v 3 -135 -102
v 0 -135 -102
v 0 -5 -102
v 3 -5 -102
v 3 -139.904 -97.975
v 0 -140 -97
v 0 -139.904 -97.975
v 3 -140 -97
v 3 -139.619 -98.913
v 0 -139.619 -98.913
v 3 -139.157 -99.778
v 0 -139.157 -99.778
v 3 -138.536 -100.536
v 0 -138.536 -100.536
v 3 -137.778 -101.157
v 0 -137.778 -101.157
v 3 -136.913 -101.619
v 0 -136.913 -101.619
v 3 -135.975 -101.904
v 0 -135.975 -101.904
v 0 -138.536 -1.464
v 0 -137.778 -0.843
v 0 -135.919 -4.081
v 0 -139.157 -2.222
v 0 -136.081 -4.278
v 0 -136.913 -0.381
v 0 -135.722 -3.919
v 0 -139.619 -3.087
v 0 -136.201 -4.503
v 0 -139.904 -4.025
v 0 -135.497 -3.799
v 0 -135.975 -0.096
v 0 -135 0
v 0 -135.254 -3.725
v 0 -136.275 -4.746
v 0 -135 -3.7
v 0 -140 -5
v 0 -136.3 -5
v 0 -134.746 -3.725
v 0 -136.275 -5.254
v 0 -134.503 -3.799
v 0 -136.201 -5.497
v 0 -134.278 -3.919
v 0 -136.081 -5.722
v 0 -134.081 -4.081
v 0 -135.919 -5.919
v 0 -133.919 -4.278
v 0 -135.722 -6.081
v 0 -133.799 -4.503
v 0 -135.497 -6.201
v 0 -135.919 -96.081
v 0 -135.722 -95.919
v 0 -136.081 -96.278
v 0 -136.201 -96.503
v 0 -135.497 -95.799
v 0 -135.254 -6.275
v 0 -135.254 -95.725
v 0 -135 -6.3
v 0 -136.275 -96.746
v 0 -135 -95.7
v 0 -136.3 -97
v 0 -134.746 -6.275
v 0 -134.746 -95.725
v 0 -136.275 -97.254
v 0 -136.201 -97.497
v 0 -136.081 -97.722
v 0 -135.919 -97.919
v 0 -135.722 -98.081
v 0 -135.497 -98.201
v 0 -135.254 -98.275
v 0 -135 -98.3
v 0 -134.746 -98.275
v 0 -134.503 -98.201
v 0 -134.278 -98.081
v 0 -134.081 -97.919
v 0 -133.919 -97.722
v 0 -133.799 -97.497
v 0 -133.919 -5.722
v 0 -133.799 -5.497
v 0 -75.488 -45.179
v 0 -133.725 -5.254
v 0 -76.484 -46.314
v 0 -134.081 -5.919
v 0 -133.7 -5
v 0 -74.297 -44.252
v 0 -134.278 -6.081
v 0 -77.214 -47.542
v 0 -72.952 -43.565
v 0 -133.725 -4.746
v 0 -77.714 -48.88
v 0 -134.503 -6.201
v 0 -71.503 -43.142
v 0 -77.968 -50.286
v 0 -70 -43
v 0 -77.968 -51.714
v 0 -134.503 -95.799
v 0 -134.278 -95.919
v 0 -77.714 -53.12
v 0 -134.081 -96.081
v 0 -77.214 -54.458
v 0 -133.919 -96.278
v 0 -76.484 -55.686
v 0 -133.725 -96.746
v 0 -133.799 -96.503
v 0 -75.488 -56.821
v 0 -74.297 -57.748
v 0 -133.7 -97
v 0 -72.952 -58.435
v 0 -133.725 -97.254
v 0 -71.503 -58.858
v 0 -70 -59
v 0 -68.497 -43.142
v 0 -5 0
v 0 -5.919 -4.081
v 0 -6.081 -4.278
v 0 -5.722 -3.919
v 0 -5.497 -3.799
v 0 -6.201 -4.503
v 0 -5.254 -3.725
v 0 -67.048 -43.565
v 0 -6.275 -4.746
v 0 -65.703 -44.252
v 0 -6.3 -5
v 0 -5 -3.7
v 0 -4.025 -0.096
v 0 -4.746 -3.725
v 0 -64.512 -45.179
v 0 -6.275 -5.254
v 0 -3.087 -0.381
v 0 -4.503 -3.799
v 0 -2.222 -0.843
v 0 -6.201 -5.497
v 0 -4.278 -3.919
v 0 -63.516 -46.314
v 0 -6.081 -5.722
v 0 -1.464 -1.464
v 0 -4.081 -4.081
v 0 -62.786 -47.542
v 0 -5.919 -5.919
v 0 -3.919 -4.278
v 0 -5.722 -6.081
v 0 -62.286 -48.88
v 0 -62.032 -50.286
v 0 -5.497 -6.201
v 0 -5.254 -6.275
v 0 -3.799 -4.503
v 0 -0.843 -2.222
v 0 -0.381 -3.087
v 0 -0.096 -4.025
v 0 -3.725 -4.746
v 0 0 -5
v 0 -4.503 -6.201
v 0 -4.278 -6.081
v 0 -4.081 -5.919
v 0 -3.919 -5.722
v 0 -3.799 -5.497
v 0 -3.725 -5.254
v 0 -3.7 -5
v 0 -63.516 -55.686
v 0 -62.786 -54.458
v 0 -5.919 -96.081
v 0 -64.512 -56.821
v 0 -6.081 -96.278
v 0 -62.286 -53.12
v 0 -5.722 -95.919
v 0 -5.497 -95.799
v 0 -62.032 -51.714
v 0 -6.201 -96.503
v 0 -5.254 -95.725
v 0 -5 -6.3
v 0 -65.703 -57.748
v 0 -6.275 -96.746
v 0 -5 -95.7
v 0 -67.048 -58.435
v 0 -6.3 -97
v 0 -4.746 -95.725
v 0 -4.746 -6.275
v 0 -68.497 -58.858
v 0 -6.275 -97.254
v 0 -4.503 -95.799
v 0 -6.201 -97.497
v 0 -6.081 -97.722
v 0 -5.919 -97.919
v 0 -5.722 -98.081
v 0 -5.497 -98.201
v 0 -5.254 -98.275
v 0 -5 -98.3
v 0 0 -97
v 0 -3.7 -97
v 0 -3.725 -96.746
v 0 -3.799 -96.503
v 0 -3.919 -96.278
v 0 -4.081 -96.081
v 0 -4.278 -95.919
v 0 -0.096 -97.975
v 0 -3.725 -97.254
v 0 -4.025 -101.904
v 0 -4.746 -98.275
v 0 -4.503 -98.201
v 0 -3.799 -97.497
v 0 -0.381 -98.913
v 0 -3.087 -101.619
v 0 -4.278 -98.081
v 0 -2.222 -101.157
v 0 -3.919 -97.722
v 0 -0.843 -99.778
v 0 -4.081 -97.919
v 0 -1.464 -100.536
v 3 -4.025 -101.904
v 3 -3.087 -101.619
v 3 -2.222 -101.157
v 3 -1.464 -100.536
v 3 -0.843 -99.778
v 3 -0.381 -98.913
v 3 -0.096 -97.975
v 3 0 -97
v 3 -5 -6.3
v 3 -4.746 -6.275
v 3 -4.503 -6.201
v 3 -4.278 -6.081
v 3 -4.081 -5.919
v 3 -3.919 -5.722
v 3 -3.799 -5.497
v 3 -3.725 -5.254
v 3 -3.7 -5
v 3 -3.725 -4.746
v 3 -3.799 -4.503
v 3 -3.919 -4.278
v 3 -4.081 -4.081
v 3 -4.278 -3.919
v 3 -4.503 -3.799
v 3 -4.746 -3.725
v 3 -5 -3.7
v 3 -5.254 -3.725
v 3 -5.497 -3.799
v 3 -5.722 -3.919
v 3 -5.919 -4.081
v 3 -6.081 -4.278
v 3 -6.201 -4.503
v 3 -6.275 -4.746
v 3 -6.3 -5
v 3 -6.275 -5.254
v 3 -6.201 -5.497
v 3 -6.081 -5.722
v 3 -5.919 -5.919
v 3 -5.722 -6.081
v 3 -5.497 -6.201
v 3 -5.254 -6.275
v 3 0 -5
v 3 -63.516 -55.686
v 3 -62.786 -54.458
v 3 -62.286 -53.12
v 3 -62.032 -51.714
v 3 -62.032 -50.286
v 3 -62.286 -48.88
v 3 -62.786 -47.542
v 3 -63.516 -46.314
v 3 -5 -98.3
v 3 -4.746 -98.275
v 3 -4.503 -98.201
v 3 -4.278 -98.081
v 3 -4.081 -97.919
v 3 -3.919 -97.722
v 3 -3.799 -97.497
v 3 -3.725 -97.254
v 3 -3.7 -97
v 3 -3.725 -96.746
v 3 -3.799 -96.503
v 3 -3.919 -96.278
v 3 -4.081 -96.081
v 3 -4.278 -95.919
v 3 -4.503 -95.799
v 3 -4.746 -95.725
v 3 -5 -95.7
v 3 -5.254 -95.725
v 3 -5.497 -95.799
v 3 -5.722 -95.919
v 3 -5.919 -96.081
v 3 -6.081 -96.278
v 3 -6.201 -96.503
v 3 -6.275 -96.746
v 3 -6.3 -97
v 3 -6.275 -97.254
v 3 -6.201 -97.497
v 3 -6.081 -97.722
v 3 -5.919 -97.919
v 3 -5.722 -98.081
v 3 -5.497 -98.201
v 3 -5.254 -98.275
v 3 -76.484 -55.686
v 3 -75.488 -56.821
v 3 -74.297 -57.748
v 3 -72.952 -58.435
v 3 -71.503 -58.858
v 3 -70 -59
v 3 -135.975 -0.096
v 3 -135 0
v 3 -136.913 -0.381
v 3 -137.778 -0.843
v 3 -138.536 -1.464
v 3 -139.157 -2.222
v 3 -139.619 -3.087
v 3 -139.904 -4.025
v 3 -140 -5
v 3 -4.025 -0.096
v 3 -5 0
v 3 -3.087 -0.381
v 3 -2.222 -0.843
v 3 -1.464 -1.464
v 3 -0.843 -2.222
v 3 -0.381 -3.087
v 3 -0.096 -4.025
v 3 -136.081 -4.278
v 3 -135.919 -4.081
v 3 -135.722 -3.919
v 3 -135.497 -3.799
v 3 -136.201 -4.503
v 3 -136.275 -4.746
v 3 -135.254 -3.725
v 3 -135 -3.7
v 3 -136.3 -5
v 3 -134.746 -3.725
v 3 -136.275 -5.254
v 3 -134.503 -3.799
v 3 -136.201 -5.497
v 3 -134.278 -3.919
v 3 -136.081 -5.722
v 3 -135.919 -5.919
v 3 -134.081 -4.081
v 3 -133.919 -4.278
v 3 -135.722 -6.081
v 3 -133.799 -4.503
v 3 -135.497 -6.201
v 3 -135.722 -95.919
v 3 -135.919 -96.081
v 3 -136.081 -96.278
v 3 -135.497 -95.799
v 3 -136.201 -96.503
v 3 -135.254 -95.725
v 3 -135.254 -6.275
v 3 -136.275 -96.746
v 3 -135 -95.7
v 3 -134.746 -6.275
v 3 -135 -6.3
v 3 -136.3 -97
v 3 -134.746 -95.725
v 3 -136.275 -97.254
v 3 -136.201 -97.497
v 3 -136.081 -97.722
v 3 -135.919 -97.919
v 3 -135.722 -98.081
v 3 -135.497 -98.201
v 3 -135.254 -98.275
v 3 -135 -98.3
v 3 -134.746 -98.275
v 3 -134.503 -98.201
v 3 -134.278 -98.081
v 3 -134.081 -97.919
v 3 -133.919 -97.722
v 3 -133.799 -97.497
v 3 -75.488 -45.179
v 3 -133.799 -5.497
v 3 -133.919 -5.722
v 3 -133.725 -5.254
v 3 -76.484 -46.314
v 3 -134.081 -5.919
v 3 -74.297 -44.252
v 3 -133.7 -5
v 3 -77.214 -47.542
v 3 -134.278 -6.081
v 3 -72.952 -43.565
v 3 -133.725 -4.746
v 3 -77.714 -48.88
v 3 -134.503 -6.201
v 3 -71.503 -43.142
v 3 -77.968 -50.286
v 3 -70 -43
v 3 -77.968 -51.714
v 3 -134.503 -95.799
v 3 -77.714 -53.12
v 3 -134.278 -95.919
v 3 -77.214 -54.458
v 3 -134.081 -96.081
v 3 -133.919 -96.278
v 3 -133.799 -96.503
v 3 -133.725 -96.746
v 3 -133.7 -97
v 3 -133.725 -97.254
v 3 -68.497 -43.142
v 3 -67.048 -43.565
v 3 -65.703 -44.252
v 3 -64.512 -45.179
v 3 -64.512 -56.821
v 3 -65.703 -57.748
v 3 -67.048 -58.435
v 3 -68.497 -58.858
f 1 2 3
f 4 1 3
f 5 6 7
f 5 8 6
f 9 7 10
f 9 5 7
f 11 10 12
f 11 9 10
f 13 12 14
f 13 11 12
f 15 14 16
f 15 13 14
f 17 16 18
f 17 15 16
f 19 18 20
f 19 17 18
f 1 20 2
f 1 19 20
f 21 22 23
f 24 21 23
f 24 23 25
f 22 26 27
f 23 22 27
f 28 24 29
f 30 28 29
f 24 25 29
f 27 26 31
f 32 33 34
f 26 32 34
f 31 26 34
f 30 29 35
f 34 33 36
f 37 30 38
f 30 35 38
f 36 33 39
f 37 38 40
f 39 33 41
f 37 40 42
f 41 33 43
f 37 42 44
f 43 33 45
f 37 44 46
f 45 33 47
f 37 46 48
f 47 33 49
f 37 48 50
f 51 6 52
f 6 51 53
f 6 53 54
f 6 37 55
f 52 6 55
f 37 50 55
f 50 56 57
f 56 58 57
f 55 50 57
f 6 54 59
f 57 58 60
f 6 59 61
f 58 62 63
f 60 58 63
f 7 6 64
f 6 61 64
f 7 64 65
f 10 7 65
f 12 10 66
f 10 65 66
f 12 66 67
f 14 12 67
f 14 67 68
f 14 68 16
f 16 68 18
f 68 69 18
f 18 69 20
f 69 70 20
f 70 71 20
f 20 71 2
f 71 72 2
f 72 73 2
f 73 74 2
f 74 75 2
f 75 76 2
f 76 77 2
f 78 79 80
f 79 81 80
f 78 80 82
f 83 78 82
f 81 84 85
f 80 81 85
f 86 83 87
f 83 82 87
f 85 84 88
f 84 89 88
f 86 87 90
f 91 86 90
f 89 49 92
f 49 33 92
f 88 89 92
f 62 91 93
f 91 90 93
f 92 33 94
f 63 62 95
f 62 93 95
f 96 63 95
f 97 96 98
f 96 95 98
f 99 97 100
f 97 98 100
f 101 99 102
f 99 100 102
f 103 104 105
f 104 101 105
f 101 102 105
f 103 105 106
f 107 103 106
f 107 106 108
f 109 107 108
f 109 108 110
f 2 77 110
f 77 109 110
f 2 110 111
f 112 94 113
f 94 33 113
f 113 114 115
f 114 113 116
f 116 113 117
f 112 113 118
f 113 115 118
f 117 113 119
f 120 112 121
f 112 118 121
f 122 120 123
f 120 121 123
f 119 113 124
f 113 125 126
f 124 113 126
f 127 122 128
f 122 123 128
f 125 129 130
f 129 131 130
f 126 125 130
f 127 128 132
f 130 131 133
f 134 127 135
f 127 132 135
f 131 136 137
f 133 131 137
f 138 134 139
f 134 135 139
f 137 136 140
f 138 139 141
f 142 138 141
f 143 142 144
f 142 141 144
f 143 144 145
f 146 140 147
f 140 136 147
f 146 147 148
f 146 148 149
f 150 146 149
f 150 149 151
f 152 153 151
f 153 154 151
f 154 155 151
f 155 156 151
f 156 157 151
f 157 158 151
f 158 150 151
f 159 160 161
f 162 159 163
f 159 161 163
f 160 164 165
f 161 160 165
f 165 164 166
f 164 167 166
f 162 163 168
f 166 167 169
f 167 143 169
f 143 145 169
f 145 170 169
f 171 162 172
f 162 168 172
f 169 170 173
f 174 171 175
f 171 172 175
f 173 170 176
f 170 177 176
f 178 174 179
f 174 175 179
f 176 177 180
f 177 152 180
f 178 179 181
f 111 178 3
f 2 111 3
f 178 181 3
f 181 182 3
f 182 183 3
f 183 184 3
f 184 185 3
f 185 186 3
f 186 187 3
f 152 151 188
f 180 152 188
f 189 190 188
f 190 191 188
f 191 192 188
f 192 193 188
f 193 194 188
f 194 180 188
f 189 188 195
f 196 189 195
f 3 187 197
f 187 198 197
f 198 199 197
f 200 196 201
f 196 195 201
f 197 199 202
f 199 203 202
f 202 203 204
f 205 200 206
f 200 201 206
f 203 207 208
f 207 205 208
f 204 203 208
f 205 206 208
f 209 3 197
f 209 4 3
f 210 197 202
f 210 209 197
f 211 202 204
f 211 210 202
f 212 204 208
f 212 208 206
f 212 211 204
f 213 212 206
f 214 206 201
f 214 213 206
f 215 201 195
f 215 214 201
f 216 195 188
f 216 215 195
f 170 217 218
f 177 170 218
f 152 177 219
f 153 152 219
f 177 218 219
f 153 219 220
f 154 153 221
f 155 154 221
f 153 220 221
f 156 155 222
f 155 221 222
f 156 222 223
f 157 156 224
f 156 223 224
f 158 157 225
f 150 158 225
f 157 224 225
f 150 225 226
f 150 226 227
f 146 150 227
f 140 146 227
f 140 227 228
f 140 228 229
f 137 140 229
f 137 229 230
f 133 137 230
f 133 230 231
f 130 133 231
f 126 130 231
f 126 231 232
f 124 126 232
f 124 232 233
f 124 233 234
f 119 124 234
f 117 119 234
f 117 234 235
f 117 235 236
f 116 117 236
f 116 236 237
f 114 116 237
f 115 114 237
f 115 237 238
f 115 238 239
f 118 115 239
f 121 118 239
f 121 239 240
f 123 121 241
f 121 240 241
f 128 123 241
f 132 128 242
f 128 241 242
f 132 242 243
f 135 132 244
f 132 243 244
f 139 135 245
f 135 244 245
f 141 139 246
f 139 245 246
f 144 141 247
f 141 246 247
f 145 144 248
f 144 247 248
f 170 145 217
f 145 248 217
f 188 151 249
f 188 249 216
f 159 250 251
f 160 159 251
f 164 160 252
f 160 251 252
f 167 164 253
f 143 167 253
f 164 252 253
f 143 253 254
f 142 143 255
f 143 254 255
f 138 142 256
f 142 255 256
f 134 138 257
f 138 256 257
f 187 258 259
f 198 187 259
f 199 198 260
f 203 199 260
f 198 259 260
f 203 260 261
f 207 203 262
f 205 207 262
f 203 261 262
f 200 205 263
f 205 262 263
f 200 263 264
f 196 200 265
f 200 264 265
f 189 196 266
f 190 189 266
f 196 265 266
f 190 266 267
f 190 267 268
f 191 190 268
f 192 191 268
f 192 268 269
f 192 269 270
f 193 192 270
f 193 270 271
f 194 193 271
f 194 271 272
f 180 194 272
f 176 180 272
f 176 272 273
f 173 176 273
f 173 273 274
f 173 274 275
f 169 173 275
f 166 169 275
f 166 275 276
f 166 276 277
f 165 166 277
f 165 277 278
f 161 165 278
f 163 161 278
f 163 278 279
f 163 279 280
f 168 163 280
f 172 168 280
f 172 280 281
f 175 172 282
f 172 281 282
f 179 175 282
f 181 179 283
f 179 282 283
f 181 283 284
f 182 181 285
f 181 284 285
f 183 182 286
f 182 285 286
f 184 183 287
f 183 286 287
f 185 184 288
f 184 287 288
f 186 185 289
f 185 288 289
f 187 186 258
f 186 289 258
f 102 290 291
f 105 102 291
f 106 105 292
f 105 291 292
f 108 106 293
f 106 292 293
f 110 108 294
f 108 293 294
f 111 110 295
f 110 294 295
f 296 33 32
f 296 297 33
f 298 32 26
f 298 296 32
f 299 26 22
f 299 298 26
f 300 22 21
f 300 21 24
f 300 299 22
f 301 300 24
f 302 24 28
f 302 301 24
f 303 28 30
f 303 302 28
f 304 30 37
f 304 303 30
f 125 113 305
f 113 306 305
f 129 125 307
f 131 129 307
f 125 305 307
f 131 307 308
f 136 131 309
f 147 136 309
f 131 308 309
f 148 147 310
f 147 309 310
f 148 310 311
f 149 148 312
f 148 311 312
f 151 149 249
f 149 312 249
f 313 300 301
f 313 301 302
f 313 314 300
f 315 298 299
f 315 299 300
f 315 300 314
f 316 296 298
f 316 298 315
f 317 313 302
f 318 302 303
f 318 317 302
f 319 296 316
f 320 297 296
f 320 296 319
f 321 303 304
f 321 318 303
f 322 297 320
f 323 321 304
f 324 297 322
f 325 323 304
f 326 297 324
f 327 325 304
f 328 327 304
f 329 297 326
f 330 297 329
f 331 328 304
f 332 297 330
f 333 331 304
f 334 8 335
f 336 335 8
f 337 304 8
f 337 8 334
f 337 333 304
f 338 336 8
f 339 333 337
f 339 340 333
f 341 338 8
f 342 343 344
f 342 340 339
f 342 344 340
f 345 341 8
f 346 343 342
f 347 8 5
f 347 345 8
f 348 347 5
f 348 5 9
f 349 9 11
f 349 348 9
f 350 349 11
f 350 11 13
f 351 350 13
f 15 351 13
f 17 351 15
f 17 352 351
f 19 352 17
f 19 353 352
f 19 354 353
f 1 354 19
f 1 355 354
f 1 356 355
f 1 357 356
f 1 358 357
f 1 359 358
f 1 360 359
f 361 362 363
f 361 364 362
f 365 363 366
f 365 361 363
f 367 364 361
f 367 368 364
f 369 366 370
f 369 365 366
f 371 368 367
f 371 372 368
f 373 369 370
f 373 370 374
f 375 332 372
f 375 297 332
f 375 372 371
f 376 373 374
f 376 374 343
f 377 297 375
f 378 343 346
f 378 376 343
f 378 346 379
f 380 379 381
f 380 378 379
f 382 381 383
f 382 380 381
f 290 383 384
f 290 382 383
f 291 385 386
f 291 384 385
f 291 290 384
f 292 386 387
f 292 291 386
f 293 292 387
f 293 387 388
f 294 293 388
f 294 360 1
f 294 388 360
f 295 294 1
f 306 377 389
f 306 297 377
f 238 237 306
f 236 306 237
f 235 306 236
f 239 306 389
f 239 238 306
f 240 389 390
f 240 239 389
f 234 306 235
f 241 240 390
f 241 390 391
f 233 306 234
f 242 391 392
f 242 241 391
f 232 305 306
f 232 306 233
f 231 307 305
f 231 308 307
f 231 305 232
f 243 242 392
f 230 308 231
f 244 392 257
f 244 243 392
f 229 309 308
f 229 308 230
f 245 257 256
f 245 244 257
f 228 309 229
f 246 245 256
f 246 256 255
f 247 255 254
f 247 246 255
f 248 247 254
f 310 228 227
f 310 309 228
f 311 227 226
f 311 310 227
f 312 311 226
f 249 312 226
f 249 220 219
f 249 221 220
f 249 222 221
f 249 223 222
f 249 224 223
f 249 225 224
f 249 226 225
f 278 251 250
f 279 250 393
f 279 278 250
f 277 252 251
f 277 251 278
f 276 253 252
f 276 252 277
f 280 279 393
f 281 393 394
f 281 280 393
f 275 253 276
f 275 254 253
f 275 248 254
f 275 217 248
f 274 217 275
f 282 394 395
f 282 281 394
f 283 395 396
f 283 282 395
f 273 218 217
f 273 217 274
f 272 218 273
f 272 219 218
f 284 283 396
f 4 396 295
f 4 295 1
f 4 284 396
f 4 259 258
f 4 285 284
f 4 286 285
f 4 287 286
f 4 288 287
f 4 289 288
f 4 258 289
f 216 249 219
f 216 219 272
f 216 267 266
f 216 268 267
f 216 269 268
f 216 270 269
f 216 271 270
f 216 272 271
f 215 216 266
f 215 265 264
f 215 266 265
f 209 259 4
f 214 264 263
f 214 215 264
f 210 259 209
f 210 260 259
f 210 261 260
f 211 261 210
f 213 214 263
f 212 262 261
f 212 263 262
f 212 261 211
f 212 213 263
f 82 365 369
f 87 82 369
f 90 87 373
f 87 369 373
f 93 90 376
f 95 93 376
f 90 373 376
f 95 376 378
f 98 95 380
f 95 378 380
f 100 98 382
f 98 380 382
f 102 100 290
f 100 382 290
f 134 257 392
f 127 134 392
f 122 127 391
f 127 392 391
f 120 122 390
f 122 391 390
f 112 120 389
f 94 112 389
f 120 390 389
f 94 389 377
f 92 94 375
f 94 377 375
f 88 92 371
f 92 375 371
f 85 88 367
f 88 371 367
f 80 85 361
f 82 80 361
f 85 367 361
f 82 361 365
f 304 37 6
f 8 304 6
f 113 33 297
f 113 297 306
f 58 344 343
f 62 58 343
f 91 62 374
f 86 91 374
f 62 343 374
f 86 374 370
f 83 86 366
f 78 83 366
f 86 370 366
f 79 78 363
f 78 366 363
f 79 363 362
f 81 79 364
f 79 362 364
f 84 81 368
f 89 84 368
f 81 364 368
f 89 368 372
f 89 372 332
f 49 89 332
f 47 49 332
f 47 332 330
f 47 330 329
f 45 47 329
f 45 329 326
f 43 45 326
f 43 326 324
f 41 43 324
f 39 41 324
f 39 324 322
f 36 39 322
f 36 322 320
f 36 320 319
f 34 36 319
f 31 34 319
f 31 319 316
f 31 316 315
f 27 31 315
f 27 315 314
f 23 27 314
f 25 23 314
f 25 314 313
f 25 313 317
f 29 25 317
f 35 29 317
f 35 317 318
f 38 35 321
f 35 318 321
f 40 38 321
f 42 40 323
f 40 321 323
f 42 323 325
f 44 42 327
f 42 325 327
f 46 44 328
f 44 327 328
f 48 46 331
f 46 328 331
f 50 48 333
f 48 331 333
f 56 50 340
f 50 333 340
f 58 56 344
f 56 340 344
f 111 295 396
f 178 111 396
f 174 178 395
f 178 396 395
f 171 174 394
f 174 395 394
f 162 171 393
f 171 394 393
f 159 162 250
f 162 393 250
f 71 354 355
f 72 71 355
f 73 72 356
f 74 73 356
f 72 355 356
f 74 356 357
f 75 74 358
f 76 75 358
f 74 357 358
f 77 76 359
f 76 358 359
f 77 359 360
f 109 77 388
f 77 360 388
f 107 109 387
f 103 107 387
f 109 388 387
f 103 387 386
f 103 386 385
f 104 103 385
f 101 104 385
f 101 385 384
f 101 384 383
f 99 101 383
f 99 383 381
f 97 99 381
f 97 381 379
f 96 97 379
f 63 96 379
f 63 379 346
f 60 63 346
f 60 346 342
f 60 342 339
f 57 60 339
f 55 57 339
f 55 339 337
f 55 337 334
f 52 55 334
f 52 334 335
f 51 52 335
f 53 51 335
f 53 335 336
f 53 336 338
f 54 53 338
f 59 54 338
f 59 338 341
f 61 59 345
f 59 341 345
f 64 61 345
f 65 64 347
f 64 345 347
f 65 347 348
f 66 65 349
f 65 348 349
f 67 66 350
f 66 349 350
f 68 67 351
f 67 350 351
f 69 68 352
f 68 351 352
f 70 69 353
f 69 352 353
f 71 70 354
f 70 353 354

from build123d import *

# Parameters (mm, degrees)
SKETCH1_W           = 102
SKETCH1_H           = 140
BOSS_EXTRUDE1_DEPTH = 3
FILLET1_R           = 5
CUT_EXTRUDE1_DEPTH  = 3
SKETCH3_R           = 1.3
CUT_EXTRUDE2_DEPTH  = 100


with BuildPart() as part:
    # Sketch1 → Boss-Extrude1 (new body)
    with BuildSketch(Plane(origin=(0, 0, 0), x_dir=(0, 0, -1), z_dir=(1, 0, 0))):
        with Locations((51, -70)):
            Rectangle(SKETCH1_W, SKETCH1_H)
    extrude(amount=BOSS_EXTRUDE1_DEPTH)

    # Fillet1
    fillet1_edges = [part.edges().sort_by_distance(p)[0] for p in [
        (1.5, 0, 0),
        (1.5, 0, -102),
        (1.5, -140, -102),
        (1.5, -140, 0),
    ]]
    fillet(fillet1_edges, radius=FILLET1_R)

    # Sketch2 → Cut-Extrude1 (cut)
    with BuildSketch(Plane(origin=(3, 0, 0), x_dir=(0, 0, -1), z_dir=(1, 0, 0))):
        with BuildLine():
            ThreePointArc((46.313735132, -76.483742869), (51, -78), (55.686264868, -76.483742869))
            Line((55.686264868, -76.483742869), (51, -70))
            Line((51, -70), (46.313735132, -76.483742869))
        make_face()
        with BuildLine():
            Line((51, -70), (55.686264868, -76.483742869))
            ThreePointArc((55.686264868, -76.483742869), (58.123556659, -73.640733515), (59, -70))
            ThreePointArc((59, -70), (58.123556659, -66.359266485), (55.686264868, -63.516257131))
            Line((55.686264868, -63.516257131), (51, -70))
        make_face()
        with BuildLine():
            Line((46.313735132, -76.483742869), (51, -70))
            Line((51, -70), (46.313735132, -63.516257131))
            ThreePointArc((46.313735132, -63.516257131), (43, -70), (46.313735132, -76.483742869))
        make_face()
        with BuildLine():
            Line((46.313735132, -63.516257131), (51, -70))
            Line((51, -70), (55.686264868, -63.516257131))
            ThreePointArc((55.686264868, -63.516257131), (51, -62), (46.313735132, -63.516257131))
        make_face()
    extrude(amount=-CUT_EXTRUDE1_DEPTH, mode=Mode.SUBTRACT)

    # Sketch3 → Cut-Extrude2 (cut)
    with BuildSketch(Plane(origin=(3, 0, 0), x_dir=(0, 0, -1), z_dir=(1, 0, 0))):
        with Locations((5, -135)):
            Circle(SKETCH3_R)
        with Locations((5, -5)):
            Circle(SKETCH3_R)
        with Locations((97, -5)):
            Circle(SKETCH3_R)
        with Locations((97, -135)):
            Circle(SKETCH3_R)
    extrude(amount=-CUT_EXTRUDE2_DEPTH, mode=Mode.SUBTRACT)


solid = part.part
